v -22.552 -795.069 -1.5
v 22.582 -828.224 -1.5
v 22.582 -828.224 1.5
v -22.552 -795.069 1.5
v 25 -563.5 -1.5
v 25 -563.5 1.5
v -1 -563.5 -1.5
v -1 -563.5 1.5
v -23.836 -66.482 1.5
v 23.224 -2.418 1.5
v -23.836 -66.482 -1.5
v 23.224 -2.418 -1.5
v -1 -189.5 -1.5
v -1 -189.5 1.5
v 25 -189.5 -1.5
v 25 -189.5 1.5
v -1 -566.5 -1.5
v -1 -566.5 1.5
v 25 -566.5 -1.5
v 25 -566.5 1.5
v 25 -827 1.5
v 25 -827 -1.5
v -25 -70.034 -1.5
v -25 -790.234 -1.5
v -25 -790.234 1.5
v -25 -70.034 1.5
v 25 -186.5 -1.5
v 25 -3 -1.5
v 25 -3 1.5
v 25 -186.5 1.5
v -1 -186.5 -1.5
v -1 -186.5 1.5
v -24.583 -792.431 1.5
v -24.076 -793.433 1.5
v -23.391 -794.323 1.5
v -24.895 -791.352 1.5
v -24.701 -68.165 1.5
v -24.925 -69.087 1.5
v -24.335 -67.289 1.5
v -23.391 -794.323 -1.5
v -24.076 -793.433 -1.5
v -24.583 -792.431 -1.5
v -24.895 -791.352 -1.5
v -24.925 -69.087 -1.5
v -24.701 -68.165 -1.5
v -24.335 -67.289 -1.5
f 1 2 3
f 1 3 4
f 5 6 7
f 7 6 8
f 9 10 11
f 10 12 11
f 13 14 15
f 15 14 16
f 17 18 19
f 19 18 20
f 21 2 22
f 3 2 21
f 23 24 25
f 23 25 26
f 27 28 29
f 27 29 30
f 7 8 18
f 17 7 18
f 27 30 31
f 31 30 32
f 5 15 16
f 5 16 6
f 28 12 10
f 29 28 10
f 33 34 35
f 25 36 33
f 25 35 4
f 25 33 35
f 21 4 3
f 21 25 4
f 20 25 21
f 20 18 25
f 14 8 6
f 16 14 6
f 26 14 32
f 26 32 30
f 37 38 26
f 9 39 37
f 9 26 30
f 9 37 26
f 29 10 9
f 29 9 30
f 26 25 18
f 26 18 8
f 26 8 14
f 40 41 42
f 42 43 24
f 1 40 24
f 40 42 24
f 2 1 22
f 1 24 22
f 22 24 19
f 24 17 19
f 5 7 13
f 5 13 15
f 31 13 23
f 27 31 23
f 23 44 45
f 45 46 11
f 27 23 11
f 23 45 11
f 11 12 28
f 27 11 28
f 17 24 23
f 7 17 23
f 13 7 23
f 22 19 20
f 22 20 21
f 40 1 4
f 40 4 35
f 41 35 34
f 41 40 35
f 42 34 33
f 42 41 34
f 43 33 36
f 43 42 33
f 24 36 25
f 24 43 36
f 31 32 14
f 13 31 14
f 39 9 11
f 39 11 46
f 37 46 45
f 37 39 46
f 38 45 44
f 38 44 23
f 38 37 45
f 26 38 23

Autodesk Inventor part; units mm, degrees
ref_plane "YZ Plane" through (0, 0, 0) normal (1, 0, 0) x (0, 1, 0)
ref_plane "XZ Plane" through (0, 0, 0) normal (0, 1, 0) x (-1, 0, 0)
ref_plane "XY Plane" through (0, 0, 0) normal (0, 0, 1) x (1, 0, 0)
sketch "Sketch1" plane through (0, 0, 0) normal (0, 0, 1) x (1, 0, 0)
  line L0 (-25, 0) -> (25, 0)
  line L1 (25, 0) -> (25, -830)
  line L2 (25, -830) -> (-25, -830)
  line L3 (-25, -830) -> (-25, 0)
  line L4 (25, -830) -> (-25, -793.2713)
  line L5 (25, 0) -> (-25, -68.0668)
  point P0 (0, 0)
  point P1 (0, 0)
  point P2 (25, -1153.2713)
  dimension "d0" = 50
  dimension "d1" = 830
  dimension "d5" = 53.7
  dimension "d6" = 53.7
extrude "Plate1" add sketch "Sketch1" along normal mid plane 3 contours L1 L4 L3 L5
chamfer "Corner Chamfer1" distance 3 angle 45 1 edges at (25, -830, 0)
chamfer "Corner Chamfer2" distance 3 angle 45 1 edges at (25, 0, 0)
fillet "Corner Round1" radius 6 1 edges at (-25, -68.0668, 0)
fillet "Corner Round2" radius 6 1 edges at (-25, -793.2713, 0)
sketch "Sketch2" plane through (0, 0, 1.5) normal (0, 0, 1) x (1, 0, 0)
  line L0 (25, -186.5) -> (-1, -186.5)
  line L1 (-1, -186.5) -> (-1, -189.5)
  line L2 (-1, -189.5) -> (25, -189.5)
  line L3 (25, -189.5) -> (25, -186.5)
  line L4 (25, -3) -> (25, -827) projected
  point P0 (0, 0)
  point P1 (25, -188)
  dimension "d15" = 188
  dimension "d16" = 26
  dimension "d17" = 3
extrude "Extrusion1" cut sketch "Sketch2" against normal through all
pattern_linear "Rectangular Pattern1" count 2 spacing 377 along (0, -1, 0) of "Extrusion1"
equation "\"d6\" = d5"
equation "\"d2\" = Thickness"
equation "\"BendReliefWidth\" = Thickness"
equation "\"BendReliefDepth\" = 0.5 * Thickness"
equation "\"CornerReliefSize\" = 4 * Thickness"
equation "\"MinimumRemnant\" = 2 * Thickness"
equation "\"TransitionRadius\" = BendRadius"
equation "\"JacobiRadiusSize\" = BendRadius"
equation "\"GapSize\" = Thickness"
equation "\"Thickness\" = 3"
equation "\"BendRadius\" = 5"
properties part number "MSC 0163 stringer cone exit back" material "Stainless Steel"
